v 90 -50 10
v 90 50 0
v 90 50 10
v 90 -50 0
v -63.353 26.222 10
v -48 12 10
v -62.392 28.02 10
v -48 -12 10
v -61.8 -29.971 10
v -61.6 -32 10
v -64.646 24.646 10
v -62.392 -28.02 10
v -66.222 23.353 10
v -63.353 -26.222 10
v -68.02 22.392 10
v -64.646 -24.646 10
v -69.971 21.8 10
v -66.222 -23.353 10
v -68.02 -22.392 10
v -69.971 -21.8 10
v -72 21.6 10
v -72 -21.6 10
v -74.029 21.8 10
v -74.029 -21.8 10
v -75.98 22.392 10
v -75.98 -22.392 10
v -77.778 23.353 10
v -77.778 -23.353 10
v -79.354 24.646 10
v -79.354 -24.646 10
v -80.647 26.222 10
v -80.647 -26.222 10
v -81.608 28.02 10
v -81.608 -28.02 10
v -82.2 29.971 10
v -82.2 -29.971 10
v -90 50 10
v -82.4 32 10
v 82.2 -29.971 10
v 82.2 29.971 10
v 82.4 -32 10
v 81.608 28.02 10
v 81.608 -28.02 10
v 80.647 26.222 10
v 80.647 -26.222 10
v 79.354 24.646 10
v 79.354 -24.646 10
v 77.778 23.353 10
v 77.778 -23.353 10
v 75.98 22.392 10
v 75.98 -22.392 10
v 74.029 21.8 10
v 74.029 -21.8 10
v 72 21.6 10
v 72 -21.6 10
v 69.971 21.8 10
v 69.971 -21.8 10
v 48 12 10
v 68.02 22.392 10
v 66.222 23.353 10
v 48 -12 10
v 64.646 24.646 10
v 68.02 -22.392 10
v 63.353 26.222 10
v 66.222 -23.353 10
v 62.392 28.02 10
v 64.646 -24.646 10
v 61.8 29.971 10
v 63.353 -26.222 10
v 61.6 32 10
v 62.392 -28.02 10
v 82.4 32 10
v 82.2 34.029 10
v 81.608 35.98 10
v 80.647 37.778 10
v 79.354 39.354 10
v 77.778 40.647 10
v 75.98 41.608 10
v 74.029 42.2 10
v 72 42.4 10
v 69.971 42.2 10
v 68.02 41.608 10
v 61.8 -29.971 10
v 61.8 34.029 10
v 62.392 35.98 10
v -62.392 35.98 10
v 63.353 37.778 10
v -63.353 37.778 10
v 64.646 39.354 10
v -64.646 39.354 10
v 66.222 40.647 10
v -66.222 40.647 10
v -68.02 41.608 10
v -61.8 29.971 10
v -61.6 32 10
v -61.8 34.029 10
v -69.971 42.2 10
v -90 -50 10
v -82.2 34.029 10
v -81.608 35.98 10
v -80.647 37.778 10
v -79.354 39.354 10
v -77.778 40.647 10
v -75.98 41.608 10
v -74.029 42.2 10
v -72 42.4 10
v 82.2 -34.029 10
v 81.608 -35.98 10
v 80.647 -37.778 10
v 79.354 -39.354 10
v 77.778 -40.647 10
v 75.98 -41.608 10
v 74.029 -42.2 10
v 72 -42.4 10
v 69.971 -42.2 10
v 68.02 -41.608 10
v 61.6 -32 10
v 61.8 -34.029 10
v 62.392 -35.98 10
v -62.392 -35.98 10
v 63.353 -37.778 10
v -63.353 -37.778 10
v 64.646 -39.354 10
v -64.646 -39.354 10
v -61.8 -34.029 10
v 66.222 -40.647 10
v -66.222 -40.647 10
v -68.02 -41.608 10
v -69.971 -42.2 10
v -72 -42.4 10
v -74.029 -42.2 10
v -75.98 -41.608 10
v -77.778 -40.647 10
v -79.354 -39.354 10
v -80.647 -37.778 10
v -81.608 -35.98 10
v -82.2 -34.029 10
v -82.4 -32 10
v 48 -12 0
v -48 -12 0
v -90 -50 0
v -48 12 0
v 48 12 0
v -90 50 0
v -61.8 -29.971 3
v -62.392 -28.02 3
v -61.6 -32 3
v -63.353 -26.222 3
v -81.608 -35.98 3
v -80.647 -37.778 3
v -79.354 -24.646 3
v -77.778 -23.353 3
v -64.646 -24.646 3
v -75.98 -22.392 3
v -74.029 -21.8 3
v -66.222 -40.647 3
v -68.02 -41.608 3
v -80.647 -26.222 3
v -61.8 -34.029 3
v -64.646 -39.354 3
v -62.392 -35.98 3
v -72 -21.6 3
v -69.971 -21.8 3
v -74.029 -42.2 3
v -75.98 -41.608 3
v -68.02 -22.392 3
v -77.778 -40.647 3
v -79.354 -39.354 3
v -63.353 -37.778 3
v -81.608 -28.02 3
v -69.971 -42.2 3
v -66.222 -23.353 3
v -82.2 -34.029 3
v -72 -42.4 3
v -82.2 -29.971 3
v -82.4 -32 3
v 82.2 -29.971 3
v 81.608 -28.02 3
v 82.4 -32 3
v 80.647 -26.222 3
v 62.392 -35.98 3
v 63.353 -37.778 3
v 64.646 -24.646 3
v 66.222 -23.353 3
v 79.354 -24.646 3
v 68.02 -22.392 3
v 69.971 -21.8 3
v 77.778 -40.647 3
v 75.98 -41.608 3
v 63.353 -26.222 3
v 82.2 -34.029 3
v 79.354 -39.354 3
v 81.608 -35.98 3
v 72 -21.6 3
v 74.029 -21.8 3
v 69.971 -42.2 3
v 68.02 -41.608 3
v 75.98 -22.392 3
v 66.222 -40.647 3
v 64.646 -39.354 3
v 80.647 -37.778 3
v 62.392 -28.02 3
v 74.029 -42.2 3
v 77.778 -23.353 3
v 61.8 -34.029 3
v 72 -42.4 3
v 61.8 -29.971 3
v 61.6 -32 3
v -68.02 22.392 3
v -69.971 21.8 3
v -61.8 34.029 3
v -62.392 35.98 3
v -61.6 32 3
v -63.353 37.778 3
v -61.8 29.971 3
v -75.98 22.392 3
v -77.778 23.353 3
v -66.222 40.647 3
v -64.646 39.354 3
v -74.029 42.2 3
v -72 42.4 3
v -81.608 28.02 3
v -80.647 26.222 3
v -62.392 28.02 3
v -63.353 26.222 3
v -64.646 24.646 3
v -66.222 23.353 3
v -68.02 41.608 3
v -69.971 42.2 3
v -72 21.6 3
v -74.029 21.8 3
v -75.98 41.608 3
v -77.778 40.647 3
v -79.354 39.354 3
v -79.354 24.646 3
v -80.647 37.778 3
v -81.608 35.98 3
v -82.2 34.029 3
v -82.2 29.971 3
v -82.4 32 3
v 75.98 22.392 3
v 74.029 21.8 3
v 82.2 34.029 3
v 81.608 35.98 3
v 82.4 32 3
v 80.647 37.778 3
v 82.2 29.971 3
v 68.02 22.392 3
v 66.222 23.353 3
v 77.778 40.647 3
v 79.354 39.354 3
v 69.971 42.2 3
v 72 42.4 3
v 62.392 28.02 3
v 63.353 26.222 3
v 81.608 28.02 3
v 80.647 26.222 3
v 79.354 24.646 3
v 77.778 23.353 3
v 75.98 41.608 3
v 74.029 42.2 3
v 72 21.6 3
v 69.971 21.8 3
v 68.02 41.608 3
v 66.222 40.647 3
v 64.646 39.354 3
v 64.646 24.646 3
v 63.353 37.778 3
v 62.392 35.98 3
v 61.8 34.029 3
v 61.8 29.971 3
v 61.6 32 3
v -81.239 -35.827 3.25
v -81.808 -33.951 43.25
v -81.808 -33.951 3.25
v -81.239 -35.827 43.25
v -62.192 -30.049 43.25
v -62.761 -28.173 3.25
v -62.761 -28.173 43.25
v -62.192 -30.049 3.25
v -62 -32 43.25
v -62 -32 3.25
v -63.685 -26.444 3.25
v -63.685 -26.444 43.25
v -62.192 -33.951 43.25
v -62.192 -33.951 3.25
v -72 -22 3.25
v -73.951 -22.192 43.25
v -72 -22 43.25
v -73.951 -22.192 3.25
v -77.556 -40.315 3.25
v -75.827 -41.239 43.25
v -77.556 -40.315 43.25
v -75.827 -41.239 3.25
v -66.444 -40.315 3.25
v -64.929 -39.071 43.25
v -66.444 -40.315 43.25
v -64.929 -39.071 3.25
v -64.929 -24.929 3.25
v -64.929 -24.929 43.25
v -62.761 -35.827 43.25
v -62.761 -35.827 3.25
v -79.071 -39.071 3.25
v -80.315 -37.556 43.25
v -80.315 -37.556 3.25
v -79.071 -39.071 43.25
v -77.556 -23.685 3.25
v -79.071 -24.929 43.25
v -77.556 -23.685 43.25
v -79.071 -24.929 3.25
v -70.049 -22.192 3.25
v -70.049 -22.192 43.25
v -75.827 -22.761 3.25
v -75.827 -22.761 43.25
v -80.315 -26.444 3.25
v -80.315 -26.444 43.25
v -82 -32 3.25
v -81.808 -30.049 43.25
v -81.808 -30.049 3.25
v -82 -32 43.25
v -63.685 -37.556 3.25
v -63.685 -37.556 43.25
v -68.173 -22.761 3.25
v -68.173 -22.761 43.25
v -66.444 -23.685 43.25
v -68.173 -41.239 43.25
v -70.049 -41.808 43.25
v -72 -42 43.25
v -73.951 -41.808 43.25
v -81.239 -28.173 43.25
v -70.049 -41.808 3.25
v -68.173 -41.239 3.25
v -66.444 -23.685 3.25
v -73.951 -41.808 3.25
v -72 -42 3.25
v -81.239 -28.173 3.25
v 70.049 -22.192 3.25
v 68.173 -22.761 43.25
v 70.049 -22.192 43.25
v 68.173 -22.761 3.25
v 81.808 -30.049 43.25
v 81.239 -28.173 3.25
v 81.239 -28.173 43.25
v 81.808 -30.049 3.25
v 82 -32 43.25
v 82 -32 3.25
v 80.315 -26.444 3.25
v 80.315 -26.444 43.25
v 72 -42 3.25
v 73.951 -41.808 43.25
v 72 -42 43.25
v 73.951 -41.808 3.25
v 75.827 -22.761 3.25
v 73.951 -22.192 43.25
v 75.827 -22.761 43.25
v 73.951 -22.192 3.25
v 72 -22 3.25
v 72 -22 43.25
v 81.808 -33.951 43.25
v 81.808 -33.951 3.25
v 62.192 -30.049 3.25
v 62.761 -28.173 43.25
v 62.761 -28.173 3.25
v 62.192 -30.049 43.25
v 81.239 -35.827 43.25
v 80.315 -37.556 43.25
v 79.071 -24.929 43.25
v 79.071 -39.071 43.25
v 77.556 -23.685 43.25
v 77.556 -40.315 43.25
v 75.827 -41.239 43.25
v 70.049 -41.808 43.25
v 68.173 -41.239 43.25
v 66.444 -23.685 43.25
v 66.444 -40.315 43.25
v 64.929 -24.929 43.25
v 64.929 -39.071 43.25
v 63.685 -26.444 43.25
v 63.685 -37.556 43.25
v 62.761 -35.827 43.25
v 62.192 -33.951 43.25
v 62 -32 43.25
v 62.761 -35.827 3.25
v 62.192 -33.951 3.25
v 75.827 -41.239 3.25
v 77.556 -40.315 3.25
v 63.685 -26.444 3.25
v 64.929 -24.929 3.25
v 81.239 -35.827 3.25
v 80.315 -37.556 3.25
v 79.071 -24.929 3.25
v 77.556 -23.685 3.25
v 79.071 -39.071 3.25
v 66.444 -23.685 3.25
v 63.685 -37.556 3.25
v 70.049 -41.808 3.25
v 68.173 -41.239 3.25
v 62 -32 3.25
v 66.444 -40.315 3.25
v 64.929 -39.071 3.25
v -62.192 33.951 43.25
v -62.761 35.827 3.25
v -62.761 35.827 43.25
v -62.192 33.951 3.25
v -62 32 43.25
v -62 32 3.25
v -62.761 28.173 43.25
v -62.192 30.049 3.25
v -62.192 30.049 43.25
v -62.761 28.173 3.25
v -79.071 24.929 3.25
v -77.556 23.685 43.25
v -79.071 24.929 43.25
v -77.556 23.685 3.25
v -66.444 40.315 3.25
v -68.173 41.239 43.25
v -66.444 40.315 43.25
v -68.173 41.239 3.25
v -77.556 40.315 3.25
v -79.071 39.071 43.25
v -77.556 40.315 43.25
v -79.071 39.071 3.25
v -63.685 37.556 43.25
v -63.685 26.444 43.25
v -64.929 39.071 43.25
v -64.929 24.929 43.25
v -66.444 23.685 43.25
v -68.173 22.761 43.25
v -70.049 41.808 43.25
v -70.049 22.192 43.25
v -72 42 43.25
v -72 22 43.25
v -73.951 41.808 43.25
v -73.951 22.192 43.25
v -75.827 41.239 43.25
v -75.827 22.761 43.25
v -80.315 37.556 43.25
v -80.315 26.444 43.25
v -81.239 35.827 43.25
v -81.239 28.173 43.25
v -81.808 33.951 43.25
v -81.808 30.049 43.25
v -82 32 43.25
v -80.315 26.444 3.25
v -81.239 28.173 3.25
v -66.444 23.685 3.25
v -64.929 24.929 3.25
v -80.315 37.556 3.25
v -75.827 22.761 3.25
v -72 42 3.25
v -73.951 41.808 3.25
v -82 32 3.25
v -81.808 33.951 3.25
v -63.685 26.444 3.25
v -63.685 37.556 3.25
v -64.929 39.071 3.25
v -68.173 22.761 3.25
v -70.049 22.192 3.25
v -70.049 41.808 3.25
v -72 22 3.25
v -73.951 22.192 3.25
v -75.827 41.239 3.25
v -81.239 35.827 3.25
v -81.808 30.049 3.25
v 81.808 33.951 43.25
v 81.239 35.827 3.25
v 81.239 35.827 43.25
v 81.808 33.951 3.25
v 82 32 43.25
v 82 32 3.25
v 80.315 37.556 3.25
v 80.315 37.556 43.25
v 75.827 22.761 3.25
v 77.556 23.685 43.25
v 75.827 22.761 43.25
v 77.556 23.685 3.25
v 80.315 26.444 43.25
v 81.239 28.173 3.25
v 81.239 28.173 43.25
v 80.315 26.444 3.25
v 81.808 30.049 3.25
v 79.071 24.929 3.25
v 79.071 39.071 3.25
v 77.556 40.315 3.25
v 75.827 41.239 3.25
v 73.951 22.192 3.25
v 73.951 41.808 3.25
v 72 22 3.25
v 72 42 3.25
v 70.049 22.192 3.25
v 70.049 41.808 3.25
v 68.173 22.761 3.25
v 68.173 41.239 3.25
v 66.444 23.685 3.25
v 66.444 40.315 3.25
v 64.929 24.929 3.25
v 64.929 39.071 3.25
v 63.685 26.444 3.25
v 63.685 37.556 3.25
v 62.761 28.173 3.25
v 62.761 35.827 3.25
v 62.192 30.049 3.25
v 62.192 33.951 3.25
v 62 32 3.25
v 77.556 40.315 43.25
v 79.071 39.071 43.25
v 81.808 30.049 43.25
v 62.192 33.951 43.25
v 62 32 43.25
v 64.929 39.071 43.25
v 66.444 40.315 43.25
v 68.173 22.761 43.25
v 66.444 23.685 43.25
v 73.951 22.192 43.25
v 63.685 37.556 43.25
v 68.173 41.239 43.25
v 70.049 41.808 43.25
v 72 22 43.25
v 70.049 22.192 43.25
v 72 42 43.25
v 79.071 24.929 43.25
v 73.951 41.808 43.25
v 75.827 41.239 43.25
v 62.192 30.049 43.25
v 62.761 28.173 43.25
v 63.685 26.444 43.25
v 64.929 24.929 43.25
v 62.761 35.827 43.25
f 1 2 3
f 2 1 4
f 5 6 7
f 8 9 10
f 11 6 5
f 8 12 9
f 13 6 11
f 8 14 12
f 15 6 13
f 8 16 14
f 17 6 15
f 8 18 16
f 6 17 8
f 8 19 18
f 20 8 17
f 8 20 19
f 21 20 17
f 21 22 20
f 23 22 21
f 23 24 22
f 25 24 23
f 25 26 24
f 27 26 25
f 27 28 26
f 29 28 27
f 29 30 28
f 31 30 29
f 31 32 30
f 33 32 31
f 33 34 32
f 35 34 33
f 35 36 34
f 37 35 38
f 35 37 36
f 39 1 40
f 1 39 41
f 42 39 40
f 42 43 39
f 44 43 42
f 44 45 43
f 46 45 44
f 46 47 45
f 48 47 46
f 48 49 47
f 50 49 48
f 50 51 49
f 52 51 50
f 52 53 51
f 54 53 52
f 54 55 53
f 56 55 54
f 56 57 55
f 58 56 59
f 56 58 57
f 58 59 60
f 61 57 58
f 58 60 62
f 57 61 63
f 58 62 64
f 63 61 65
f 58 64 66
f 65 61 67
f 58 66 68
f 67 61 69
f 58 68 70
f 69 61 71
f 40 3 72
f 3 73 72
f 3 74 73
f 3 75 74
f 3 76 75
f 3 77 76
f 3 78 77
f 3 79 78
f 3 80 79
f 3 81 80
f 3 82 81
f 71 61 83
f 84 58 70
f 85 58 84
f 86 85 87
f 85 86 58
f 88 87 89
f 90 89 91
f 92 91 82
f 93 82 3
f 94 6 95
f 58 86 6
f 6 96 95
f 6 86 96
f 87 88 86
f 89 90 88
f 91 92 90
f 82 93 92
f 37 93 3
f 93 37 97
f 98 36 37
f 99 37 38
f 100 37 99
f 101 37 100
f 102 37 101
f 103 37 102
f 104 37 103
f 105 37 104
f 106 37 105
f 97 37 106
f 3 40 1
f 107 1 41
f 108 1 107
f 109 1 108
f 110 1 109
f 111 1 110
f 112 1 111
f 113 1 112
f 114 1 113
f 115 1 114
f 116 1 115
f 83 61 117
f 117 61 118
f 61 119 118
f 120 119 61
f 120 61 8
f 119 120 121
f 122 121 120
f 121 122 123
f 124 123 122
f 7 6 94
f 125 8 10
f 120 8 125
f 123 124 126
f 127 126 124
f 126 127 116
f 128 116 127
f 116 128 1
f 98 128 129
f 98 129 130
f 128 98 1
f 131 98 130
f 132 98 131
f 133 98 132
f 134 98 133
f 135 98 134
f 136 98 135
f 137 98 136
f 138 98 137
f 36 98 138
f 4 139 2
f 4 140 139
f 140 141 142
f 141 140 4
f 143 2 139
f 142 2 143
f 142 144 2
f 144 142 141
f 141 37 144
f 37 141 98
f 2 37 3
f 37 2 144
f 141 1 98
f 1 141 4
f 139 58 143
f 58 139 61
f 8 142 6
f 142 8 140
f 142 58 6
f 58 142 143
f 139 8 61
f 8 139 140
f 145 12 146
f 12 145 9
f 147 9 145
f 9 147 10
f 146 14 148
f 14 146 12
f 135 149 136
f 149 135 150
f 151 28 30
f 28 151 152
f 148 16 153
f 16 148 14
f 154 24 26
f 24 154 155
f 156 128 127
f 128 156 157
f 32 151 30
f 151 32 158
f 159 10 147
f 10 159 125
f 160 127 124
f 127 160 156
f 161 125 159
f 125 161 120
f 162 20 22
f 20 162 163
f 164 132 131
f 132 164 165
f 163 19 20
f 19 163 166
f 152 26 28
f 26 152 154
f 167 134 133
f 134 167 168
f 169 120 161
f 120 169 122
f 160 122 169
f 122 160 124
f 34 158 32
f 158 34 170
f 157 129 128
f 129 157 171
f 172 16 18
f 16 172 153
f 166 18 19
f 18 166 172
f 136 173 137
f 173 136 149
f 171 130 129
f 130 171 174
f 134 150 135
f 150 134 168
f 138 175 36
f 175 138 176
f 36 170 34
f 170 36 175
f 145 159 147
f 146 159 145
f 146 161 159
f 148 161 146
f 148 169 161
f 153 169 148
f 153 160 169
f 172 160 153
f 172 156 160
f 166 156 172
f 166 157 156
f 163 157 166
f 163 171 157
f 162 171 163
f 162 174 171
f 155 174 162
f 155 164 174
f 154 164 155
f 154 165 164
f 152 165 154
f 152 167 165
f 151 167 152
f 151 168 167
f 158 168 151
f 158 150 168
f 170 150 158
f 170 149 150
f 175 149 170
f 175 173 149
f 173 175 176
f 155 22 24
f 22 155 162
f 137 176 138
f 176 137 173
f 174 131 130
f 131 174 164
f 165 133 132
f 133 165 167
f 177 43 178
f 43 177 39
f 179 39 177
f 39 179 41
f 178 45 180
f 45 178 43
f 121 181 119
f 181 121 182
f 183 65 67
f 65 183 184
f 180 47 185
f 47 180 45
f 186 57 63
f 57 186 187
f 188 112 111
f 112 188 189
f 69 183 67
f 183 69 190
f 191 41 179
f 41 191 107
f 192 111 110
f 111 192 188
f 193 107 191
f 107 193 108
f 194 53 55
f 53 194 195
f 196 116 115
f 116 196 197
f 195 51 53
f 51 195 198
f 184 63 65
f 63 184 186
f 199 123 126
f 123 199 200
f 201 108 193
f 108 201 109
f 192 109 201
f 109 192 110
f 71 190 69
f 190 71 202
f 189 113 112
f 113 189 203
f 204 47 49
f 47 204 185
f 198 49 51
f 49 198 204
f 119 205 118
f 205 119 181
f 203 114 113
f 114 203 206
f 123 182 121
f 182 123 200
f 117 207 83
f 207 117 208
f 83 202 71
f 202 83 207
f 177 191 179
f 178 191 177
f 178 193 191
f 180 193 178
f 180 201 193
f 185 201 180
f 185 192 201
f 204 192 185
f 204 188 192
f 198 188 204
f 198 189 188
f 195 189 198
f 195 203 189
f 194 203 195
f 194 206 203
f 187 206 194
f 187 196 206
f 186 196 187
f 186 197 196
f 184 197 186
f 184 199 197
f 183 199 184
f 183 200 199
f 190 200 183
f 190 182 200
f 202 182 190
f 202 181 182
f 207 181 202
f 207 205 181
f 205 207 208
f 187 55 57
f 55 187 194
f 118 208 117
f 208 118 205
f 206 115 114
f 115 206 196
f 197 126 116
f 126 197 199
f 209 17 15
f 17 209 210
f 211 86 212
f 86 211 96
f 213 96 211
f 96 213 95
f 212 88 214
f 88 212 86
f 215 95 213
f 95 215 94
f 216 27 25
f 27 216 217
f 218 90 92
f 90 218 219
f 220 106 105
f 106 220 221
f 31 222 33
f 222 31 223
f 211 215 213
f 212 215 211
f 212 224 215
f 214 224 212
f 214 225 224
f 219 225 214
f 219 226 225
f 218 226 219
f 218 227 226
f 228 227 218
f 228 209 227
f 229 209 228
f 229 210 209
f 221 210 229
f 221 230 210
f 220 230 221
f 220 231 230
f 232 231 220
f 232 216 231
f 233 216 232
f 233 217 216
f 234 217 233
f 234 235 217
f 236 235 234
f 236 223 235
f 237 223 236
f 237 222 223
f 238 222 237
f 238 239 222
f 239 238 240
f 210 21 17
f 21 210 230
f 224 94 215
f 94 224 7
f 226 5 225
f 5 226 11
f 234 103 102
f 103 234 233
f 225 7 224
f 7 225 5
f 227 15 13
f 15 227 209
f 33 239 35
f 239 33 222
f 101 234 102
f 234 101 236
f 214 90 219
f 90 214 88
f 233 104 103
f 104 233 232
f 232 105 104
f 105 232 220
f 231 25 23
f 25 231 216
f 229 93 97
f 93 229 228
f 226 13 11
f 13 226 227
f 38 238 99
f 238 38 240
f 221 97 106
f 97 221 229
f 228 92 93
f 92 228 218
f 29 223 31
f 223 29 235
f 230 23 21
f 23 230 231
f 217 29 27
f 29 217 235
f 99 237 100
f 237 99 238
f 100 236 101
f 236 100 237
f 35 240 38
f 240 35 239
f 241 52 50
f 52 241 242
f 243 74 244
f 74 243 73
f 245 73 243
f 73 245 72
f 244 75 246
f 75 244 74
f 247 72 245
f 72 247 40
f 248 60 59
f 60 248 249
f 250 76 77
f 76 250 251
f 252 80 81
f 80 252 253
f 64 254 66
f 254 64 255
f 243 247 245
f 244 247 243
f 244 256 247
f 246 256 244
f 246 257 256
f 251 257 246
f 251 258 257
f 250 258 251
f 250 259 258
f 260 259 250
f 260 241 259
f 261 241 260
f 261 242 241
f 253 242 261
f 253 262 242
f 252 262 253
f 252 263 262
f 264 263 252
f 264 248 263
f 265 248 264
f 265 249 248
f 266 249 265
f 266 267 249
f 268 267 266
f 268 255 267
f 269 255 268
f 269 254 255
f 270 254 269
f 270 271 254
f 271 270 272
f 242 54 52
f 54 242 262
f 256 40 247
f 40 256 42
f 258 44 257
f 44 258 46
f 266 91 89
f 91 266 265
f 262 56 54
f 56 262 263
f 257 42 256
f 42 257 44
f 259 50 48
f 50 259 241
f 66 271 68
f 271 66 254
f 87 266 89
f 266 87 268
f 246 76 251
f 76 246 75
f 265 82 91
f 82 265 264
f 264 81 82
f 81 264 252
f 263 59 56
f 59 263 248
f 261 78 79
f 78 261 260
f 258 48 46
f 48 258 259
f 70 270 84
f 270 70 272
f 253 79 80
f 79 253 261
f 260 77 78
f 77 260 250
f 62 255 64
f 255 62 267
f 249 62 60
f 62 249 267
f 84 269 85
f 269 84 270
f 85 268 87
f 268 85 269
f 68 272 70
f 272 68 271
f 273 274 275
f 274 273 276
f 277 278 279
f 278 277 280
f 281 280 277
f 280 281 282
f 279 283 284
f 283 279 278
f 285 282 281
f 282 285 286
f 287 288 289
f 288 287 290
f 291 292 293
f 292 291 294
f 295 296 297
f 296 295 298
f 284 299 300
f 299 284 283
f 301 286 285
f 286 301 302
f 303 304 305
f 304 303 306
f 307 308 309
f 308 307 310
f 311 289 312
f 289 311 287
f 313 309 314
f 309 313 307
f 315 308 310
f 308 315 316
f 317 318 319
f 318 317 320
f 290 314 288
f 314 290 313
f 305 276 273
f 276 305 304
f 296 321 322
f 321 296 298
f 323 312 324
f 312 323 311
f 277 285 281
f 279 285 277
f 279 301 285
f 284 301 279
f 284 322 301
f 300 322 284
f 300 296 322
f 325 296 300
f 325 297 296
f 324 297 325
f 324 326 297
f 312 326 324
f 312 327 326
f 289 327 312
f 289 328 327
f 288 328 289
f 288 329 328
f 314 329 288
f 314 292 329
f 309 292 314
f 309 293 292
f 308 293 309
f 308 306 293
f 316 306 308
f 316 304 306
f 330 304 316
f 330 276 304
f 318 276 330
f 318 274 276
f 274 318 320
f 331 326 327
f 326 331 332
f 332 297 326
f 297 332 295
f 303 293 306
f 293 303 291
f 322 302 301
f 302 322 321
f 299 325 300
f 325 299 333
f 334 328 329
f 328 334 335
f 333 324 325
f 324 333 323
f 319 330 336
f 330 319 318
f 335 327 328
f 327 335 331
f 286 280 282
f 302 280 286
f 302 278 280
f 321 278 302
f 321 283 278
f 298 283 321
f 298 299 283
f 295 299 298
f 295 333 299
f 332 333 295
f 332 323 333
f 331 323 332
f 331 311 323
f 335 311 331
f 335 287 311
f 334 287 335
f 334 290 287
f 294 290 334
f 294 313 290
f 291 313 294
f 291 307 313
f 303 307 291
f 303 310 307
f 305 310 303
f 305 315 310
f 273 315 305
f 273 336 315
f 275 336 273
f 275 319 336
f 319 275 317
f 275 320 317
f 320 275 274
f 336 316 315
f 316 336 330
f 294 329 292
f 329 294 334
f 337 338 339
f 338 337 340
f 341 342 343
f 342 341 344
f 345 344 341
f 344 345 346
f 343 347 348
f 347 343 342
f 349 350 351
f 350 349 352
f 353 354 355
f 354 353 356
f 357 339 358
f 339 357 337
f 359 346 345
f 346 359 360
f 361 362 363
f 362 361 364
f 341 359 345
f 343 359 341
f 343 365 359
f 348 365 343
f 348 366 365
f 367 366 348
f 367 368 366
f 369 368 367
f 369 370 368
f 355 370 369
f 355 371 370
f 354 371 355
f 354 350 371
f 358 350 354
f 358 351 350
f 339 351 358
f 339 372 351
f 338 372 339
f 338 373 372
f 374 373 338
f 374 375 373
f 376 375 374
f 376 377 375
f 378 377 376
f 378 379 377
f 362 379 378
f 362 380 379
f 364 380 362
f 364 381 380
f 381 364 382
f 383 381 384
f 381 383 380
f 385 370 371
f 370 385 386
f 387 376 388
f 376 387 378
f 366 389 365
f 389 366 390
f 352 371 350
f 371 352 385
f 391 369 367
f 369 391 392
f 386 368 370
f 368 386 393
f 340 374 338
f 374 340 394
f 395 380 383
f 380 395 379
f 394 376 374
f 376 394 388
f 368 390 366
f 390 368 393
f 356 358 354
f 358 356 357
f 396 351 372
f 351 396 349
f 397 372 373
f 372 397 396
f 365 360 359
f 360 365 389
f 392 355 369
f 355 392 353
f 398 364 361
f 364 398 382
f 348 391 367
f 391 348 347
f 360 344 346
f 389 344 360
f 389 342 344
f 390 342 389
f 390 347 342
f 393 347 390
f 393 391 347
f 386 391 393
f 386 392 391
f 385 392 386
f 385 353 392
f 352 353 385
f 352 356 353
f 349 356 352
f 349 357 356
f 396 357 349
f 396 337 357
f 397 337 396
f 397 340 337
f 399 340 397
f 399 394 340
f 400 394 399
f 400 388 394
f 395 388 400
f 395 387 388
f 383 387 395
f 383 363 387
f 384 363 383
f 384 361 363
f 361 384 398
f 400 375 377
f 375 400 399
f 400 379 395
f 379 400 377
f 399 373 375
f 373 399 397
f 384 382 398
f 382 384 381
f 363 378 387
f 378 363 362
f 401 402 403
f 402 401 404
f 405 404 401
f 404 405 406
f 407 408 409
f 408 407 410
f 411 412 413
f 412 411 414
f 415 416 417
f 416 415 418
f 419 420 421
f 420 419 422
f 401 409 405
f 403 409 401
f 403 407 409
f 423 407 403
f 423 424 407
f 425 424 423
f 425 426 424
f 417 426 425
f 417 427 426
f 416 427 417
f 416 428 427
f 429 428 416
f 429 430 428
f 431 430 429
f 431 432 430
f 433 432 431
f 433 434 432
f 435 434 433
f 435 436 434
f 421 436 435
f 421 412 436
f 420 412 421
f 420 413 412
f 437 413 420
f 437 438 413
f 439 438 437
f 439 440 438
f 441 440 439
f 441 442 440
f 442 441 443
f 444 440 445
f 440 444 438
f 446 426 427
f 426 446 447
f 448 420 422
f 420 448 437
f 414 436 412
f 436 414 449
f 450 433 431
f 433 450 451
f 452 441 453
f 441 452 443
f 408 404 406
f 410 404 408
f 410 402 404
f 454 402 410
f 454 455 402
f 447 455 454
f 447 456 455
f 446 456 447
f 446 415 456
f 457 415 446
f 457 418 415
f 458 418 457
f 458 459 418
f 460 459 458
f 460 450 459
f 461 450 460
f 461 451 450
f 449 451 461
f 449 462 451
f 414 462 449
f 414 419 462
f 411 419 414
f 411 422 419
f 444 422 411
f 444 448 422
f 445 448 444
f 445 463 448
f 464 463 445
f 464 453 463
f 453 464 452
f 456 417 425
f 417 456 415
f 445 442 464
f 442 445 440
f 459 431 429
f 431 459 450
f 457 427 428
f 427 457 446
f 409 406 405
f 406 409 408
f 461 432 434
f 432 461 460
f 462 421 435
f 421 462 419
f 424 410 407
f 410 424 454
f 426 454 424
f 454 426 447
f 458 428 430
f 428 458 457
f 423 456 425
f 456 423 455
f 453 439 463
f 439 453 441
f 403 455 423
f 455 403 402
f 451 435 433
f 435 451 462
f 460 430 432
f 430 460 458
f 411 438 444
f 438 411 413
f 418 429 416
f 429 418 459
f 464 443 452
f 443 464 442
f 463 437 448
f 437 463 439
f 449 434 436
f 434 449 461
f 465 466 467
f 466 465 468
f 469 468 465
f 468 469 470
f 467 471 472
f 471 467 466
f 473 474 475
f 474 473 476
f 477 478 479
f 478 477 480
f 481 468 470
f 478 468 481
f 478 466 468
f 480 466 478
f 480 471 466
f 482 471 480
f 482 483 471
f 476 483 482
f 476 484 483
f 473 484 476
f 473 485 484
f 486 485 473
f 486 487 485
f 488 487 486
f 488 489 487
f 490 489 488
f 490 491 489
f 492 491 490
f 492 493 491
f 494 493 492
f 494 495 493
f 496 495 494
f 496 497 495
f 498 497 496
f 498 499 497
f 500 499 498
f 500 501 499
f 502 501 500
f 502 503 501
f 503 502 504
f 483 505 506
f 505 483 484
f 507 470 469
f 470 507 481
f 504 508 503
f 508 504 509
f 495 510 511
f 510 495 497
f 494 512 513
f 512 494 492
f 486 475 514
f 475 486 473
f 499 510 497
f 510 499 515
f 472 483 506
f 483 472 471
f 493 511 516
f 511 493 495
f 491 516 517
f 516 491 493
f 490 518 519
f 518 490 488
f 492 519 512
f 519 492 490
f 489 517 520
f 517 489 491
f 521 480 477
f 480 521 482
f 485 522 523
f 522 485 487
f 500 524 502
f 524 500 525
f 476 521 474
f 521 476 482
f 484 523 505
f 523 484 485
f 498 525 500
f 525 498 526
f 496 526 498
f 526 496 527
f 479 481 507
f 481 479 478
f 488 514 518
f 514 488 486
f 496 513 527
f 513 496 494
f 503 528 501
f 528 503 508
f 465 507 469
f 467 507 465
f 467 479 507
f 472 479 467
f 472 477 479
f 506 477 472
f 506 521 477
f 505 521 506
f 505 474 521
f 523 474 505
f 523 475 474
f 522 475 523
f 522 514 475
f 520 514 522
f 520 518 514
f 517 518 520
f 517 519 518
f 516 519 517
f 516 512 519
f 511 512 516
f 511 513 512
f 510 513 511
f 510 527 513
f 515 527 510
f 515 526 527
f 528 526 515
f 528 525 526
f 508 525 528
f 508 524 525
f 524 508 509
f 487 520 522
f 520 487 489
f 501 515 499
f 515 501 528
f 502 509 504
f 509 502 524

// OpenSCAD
$fn = 32;

// ------------------------------------------------------------------------
// Frame with four posts: 180 x 100 mm frame, four d20 posts
// Every part is its own module, assembly() places them once.
// ------------------------------------------------------------------------

// --- part 1 ---
module base_frame() {
  difference() {
    translate([-90, -50, 0]) cube([180, 100, 10]);
    translate([-48, -12, -1]) cube([96, 24, 12]);
    translate([-72, -32, 3]) cylinder(h = 8, d = 20.8);
    translate([72, -32, 3]) cylinder(h = 8, d = 20.8);
    translate([-72, 32, 3]) cylinder(h = 8, d = 20.8);
    translate([72, 32, 3]) cylinder(h = 8, d = 20.8);
  }
}

// --- part 2 ---
module post1() {
  cylinder(h = 40, d = 20);
}

// --- part 3 ---
module post2() {
  cylinder(h = 40, d = 20);
}

// --- part 4 ---
module post3() {
  cylinder(h = 40, d = 20);
}

// --- part 5 ---
module post4() {
  cylinder(h = 40, d = 20);
}

// --- assembly ---
module assembly() {
  translate([0, 0, 0]) rotate([0, 0, 0]) base_frame();
  translate([-72, -32, 3.25]) rotate([0, 0, 0]) post1();
  translate([72, -32, 3.25]) rotate([0, 0, 0]) post2();
  translate([-72, 32, 3.25]) rotate([0, 0, 0]) post3();
  translate([72, 32, 3.25]) rotate([0, 0, 0]) post4();
}

assembly();
